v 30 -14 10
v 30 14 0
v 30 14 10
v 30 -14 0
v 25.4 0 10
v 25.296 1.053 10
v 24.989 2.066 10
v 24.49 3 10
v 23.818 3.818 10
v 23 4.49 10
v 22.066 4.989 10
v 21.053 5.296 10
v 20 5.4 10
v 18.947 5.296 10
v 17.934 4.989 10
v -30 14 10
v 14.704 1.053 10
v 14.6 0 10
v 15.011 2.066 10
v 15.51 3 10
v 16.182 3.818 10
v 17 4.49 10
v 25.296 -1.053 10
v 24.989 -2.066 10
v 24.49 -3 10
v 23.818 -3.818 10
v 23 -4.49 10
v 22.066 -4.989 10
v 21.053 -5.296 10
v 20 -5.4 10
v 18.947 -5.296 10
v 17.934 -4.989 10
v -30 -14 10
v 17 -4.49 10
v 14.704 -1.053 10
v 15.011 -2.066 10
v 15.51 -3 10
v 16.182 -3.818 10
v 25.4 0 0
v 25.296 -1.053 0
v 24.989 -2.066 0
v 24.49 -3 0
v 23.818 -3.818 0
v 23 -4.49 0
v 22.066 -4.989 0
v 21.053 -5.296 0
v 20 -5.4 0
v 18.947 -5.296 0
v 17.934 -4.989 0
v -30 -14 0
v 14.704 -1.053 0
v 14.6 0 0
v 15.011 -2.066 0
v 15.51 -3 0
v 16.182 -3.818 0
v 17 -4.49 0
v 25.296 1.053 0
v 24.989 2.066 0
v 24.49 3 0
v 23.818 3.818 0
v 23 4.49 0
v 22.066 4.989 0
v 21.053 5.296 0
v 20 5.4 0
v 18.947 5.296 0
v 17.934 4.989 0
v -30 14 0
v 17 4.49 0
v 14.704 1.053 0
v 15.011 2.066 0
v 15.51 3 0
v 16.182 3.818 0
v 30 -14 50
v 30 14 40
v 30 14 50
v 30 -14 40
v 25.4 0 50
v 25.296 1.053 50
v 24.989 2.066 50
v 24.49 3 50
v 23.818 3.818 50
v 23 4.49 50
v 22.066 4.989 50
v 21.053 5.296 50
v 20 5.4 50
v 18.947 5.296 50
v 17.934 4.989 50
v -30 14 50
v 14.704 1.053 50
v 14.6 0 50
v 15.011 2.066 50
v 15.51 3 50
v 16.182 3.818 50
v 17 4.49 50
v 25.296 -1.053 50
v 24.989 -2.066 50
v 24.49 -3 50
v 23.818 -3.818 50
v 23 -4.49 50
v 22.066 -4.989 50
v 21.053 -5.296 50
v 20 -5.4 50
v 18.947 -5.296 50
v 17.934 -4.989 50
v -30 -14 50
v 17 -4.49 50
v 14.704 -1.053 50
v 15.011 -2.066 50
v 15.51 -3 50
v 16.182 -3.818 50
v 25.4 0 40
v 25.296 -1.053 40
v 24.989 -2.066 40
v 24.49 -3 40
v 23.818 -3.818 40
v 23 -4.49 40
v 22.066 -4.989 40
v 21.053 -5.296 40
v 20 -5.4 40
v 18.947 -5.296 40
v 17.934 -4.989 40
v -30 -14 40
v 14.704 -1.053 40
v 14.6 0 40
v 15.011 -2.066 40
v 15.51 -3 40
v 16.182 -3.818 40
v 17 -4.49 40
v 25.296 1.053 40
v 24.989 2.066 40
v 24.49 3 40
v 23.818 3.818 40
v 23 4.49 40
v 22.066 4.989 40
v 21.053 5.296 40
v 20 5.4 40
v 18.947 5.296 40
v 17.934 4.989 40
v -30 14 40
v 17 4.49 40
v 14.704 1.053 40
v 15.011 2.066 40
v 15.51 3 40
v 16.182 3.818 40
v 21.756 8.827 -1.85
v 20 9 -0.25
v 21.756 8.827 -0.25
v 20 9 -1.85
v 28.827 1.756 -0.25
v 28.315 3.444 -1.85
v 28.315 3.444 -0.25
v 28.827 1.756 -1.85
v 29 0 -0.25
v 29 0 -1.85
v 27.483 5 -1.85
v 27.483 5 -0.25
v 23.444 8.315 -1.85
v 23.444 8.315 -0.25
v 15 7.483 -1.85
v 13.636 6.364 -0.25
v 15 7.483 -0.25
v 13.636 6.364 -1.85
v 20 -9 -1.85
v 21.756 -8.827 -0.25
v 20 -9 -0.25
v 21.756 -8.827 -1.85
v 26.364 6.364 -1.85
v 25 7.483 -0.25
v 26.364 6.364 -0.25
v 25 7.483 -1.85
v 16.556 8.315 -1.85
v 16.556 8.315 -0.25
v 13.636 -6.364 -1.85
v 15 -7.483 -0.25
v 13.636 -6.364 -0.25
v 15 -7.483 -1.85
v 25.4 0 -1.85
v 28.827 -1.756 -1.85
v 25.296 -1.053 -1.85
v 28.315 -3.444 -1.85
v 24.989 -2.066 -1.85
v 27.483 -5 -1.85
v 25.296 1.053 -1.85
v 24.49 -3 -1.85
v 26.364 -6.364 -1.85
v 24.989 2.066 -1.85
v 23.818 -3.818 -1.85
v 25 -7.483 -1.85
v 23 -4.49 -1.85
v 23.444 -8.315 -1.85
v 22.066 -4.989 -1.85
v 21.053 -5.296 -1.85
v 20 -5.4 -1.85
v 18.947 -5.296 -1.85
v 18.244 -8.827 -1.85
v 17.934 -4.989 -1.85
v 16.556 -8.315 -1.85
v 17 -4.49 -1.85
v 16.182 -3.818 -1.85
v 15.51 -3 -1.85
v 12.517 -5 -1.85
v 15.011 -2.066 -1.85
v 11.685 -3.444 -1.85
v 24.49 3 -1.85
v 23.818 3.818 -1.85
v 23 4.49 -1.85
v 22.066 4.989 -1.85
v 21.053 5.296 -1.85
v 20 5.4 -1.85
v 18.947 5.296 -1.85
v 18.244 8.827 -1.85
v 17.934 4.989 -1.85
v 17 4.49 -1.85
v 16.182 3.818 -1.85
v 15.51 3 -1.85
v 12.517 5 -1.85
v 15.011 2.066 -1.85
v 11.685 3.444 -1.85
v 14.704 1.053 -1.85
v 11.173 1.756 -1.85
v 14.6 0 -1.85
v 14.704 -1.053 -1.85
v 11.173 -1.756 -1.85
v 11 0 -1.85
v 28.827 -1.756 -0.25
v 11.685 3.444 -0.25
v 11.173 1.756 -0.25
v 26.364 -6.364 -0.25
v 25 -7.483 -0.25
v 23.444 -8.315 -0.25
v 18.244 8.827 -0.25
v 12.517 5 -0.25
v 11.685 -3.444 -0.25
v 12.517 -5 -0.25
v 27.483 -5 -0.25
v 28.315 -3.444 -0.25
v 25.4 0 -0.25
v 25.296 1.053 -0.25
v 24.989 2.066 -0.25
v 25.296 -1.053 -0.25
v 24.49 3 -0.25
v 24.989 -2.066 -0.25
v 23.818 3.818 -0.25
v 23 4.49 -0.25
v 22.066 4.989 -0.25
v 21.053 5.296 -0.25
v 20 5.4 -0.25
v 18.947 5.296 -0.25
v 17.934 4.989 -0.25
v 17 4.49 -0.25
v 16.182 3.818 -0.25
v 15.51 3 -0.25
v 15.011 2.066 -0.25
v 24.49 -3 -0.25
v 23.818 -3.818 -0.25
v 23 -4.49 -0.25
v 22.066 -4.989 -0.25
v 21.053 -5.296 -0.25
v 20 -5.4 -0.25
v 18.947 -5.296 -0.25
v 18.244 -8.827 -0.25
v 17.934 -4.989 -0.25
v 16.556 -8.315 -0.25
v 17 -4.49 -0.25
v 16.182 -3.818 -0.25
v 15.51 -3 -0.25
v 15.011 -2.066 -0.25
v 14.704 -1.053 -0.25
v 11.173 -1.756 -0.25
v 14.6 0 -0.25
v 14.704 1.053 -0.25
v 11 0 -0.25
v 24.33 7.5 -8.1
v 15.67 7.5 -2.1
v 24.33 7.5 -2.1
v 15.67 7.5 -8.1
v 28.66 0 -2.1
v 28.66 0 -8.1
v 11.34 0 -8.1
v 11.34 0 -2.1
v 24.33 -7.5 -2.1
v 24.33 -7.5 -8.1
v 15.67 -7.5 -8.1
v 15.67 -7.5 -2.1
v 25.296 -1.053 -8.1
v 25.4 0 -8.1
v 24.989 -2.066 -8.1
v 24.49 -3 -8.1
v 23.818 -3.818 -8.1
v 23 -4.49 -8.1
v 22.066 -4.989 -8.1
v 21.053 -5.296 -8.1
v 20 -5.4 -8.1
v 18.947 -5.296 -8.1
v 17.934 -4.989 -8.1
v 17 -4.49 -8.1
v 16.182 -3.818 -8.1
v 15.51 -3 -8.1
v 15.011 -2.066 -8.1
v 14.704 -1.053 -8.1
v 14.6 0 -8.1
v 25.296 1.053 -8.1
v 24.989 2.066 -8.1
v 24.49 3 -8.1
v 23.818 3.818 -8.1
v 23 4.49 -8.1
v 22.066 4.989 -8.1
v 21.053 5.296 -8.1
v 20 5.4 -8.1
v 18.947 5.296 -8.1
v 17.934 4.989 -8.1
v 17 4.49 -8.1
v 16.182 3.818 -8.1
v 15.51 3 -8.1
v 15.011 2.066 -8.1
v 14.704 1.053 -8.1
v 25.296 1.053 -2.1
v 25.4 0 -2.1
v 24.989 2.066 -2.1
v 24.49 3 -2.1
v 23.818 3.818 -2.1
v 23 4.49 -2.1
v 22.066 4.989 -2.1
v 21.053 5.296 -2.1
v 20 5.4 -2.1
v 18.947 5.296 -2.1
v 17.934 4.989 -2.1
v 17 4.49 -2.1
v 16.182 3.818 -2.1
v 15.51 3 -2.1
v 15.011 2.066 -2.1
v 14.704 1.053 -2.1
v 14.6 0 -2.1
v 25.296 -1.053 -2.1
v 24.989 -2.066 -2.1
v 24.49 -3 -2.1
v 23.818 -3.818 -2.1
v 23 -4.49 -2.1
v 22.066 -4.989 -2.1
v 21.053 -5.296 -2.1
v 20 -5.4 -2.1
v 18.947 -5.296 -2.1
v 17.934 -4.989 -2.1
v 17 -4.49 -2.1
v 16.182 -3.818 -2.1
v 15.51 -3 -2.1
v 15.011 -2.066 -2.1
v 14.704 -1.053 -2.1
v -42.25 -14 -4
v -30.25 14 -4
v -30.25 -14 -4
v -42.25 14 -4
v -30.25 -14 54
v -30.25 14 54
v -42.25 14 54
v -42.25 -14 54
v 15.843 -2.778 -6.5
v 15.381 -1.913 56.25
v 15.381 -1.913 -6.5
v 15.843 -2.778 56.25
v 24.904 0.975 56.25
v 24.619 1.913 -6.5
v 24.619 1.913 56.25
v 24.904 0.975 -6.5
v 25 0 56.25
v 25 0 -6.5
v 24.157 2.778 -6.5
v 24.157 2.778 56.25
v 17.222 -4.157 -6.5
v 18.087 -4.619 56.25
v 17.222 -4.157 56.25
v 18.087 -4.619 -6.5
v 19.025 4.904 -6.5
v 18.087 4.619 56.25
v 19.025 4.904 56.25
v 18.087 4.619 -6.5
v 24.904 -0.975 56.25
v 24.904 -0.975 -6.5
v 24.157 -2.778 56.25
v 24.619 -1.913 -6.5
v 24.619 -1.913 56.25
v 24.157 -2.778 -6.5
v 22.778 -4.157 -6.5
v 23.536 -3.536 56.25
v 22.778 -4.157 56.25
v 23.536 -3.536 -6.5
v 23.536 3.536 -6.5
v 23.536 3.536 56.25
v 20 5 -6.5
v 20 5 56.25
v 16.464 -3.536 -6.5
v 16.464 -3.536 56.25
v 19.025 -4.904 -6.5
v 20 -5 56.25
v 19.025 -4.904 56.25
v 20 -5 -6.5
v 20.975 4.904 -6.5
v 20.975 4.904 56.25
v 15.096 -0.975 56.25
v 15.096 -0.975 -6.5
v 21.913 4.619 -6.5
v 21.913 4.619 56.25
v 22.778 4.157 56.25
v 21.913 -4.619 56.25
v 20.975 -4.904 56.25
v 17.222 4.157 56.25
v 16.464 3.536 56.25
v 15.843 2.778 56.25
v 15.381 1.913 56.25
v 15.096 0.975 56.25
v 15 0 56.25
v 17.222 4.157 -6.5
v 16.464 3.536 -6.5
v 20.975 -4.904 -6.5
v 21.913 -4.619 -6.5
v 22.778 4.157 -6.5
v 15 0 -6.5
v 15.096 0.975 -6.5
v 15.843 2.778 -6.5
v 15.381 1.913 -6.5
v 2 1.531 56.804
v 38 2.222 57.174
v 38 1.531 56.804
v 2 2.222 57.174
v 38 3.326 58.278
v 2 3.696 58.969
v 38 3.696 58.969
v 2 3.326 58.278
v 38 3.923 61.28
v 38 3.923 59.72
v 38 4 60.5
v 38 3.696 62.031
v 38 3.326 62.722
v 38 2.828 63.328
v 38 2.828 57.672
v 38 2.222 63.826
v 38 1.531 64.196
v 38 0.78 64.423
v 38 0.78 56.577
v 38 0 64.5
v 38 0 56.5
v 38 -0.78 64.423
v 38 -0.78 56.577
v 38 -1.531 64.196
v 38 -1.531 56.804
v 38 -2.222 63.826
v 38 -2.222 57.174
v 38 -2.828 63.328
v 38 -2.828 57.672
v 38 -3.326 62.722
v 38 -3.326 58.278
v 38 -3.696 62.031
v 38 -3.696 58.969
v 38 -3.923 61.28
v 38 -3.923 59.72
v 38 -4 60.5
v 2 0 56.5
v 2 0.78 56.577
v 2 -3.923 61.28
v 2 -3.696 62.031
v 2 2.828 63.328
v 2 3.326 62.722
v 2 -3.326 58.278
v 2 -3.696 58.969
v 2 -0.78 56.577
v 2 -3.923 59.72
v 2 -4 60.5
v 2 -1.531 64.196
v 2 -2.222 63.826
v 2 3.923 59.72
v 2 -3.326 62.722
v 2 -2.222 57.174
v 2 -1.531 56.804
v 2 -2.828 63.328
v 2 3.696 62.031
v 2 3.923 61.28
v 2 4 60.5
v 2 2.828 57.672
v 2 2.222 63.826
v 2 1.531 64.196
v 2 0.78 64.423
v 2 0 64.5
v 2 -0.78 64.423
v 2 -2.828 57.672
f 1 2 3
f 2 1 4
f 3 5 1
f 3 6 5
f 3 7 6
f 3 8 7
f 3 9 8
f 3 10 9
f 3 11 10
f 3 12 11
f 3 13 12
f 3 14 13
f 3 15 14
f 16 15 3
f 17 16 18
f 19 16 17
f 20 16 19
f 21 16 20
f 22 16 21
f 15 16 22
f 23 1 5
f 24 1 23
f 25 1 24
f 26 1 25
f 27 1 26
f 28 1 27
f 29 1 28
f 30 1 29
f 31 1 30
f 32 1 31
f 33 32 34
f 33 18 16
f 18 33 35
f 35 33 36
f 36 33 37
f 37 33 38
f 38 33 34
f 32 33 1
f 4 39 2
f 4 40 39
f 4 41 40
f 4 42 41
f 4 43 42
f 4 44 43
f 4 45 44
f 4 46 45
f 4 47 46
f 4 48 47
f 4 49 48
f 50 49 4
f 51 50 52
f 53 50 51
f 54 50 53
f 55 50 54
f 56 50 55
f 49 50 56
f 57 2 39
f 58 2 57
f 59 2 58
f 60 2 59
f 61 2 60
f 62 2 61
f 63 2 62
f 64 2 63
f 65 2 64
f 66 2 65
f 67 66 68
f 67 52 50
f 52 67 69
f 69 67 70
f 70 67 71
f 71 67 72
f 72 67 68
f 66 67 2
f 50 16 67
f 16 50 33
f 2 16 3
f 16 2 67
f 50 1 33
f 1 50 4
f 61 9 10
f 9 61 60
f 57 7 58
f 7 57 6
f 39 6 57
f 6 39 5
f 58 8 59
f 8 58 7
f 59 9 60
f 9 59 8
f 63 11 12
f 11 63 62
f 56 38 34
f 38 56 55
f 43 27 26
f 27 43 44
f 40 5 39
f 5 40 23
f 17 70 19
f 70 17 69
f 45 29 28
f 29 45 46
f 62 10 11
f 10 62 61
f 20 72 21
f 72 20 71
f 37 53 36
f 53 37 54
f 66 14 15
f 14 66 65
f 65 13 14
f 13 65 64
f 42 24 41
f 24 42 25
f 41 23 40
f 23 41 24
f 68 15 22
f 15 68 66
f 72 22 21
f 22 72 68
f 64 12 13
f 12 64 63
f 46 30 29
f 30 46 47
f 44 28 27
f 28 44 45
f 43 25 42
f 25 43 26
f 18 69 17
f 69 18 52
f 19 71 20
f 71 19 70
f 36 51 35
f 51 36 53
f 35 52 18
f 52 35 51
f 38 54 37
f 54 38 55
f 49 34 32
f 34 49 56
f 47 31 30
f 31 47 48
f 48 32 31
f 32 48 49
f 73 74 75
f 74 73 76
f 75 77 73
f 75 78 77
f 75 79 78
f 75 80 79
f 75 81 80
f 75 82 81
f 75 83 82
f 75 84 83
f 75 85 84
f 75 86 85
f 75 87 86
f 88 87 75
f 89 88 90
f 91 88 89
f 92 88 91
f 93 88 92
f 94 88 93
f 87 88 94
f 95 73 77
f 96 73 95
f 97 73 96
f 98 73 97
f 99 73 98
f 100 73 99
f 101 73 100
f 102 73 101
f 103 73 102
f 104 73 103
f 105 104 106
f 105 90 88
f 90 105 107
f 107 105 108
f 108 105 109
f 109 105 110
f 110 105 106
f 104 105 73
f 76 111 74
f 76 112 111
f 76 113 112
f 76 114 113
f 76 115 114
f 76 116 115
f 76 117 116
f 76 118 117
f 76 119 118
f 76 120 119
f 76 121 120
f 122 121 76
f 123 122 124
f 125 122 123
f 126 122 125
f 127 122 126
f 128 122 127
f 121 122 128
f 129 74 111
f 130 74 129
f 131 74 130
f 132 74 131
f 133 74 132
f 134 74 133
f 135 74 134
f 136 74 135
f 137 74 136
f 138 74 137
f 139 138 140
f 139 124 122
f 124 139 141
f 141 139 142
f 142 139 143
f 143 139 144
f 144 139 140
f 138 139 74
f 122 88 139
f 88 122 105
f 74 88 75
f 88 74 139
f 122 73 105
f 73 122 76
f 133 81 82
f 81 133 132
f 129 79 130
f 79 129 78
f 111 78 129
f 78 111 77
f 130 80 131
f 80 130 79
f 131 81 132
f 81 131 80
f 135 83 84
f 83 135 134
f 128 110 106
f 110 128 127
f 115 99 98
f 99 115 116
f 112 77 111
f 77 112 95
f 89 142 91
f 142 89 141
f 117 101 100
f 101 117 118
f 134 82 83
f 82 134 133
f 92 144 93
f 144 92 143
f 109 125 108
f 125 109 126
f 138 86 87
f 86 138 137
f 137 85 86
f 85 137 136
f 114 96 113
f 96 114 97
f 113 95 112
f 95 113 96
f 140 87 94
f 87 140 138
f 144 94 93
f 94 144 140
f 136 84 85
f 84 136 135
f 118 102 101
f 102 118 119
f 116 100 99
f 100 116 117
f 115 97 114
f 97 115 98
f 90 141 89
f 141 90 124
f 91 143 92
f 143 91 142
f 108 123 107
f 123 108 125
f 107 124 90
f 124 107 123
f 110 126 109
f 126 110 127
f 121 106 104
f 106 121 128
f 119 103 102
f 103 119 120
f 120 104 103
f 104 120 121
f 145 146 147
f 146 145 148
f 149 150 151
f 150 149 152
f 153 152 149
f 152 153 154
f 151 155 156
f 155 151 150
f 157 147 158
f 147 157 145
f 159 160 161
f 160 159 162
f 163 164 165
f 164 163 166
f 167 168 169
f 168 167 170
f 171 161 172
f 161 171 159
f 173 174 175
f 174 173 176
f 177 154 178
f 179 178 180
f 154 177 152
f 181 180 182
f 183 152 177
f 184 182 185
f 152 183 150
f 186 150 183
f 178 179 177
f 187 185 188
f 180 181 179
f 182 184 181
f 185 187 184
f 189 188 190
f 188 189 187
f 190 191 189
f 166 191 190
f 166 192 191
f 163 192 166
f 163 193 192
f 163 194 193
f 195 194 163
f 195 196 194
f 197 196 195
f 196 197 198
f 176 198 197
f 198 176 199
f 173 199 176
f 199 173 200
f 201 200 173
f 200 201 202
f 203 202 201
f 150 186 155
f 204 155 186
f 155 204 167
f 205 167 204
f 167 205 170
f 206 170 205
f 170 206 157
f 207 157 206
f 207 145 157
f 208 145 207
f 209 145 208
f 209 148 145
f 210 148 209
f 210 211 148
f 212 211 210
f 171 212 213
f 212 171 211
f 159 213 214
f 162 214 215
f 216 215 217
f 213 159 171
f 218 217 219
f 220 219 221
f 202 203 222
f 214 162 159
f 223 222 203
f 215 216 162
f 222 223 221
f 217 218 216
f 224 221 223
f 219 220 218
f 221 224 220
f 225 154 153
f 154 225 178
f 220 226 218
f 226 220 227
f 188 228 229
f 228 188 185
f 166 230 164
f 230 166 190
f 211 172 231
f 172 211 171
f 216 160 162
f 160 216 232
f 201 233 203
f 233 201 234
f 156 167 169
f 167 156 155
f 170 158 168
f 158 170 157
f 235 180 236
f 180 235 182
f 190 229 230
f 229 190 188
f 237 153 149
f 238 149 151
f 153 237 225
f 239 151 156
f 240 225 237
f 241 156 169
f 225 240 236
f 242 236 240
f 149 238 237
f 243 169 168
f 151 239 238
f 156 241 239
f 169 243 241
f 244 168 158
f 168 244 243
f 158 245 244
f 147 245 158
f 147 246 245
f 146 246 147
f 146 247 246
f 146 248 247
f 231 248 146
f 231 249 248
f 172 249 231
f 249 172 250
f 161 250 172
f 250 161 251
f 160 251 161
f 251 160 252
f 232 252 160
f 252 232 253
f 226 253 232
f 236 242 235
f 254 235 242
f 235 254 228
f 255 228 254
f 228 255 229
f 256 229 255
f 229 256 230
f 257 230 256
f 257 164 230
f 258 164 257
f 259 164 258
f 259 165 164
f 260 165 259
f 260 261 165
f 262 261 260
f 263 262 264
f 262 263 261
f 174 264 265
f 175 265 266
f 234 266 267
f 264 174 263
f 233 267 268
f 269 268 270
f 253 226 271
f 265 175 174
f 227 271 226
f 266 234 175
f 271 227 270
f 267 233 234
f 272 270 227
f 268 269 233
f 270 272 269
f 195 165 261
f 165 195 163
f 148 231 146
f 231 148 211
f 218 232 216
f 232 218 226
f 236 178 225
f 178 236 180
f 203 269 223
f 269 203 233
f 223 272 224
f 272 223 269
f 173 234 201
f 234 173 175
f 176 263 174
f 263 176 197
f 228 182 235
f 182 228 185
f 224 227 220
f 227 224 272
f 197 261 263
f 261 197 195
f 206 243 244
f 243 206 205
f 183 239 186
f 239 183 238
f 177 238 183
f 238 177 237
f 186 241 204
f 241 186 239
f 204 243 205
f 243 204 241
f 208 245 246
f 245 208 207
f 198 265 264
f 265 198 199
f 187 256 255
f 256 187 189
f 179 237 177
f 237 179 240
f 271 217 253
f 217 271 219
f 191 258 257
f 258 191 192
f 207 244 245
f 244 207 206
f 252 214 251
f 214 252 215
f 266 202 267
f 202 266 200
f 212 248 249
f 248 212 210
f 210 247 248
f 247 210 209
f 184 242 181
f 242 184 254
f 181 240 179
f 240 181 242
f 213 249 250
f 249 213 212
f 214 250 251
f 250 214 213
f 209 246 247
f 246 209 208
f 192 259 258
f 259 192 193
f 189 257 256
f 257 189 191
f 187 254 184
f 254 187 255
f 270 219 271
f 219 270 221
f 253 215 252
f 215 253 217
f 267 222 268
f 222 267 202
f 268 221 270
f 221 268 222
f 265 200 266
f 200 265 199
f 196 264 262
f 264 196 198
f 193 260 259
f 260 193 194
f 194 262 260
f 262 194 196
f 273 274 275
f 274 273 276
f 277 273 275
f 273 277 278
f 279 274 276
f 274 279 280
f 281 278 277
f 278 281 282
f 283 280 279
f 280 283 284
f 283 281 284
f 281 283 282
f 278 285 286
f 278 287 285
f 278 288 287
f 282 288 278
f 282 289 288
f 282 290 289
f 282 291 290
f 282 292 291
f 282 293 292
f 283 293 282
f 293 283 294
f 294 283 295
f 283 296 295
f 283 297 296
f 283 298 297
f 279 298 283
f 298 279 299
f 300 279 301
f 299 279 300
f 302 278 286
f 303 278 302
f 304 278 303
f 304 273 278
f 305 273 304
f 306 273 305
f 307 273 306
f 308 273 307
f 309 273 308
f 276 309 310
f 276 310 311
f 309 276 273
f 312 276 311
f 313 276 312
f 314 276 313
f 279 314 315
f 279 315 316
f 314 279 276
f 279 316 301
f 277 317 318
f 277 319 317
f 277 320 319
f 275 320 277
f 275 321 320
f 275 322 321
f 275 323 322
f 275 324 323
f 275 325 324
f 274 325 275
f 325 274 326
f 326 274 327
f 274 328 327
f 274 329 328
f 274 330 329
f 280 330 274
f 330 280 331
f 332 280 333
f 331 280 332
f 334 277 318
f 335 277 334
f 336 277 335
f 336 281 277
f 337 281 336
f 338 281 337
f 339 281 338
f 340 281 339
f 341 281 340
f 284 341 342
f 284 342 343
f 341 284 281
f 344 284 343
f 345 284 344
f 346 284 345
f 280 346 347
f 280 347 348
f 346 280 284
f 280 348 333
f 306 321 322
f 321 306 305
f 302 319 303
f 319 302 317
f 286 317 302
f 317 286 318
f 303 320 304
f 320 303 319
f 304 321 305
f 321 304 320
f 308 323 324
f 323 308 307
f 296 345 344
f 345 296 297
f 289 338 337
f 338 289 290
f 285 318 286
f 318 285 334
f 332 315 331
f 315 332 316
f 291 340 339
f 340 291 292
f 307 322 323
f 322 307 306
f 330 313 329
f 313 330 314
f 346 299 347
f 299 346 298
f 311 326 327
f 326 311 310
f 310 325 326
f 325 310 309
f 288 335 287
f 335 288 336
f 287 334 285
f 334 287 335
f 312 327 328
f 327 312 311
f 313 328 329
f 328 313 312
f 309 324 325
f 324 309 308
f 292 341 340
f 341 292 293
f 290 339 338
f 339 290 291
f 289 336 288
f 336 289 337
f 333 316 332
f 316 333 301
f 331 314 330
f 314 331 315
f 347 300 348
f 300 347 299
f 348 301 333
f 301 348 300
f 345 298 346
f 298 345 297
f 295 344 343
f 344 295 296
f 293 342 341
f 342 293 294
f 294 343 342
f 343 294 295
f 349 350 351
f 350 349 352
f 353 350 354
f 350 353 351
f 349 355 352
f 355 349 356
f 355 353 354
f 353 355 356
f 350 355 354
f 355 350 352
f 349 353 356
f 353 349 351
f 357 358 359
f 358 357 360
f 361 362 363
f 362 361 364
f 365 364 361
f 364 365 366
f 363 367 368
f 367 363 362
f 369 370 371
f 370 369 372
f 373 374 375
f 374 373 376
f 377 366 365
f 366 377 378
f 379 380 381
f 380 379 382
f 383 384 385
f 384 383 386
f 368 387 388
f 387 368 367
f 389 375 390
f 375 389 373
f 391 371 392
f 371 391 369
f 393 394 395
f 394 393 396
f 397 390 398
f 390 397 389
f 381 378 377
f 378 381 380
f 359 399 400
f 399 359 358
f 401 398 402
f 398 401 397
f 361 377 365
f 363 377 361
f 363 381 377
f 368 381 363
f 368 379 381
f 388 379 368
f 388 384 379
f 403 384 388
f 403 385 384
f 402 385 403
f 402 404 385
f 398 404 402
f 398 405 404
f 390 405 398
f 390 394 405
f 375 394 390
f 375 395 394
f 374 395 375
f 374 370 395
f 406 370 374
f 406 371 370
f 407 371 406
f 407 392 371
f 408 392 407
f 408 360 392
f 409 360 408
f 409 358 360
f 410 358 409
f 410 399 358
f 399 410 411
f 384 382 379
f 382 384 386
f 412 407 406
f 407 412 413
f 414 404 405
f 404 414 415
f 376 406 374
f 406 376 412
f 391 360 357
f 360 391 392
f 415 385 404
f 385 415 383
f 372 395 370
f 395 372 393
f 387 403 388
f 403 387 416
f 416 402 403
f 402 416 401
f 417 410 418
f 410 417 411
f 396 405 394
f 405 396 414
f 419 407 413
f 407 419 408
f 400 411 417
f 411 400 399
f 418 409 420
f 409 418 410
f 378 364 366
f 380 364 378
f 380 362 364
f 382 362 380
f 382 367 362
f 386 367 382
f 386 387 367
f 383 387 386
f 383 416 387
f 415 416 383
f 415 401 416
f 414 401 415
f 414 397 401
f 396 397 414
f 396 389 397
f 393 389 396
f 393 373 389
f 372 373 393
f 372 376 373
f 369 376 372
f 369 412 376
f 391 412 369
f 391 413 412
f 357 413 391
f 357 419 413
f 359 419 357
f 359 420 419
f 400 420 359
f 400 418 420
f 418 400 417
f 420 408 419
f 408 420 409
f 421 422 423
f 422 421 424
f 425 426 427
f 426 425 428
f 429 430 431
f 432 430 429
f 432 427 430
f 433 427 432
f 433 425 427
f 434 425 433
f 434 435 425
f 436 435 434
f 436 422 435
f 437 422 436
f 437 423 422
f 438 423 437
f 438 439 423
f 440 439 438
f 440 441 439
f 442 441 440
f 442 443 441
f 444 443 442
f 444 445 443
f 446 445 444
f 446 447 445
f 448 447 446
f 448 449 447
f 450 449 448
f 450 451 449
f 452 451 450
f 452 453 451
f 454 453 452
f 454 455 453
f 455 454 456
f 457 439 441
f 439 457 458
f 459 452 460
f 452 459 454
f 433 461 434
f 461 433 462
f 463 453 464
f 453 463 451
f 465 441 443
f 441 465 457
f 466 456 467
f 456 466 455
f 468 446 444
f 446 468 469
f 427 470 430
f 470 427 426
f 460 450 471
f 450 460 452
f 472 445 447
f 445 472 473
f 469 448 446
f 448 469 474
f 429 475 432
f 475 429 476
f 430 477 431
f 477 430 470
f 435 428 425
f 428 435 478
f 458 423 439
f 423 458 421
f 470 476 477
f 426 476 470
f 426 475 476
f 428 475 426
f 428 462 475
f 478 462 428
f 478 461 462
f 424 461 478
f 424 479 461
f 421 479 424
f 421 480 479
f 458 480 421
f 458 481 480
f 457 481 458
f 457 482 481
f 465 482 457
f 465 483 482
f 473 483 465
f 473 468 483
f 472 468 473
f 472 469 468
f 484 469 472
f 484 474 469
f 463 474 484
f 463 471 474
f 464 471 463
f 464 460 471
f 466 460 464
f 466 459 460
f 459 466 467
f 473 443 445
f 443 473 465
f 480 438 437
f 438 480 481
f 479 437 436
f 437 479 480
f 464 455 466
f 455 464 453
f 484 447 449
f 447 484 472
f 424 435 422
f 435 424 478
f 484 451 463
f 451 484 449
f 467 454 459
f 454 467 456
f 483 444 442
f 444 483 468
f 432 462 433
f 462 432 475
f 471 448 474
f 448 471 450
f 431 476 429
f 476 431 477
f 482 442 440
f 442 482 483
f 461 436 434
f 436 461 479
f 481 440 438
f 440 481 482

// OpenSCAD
$fn = 32;

// ------------------------------------------------------------------------
// C clamp: throat 40 mm, screw d10
// Every part is its own module, assembly() places every instance.
// ------------------------------------------------------------------------

// --- part 1 ---
module clamp_arm() {
  difference() {
    translate([-30, -14, 0]) cube([60, 28, 10]);
    translate([20, 0, -1]) cylinder(h = 12, d = 10.8);
  }
}

// --- part 2 ---
module clamp_spine() {
  difference() {
    translate([-29, -14, 0]) cube([58, 28, 12]);
  }
}

// --- part 3 ---
module clamp_screw() {
  translate([0, 0, -31.375]) cylinder(h = 62.75, d = 10);
}

// --- part 4 ---
module clamp_washer() {
  difference() {
      translate([0, 0, 0]) cylinder(h = 1.6, d = 18);
      translate([0, 0, -1]) cylinder(h = 3.6, d = 10.8);
    }
}

// --- part 5 ---
module clamp_nut() {
  difference() {
    linear_extrude(height = 6) polygon(points = [[8.66, 0], [4.33, 7.5], [-4.33, 7.5], [-8.66, 0], [-4.33, -7.5], [4.33, -7.5]]);
    translate([0, 0, -1]) cylinder(h = 8, d = 10.8);
  }
}

// --- part 6 ---
module tommy_bar() {
  translate([0, 0, -18]) cylinder(h = 36, d = 8);
}

// --- assembly ---
module assembly() {
  color([0.80, 0.24, 0.20]) translate([0, 0, 0]) rotate([0, 0, 0]) clamp_arm();
  color([0.20, 0.45, 0.75]) translate([0, 0, 40]) rotate([0, 0, 0]) clamp_arm();
  color([0.25, 0.62, 0.32]) translate([-42.25, 0, 25]) rotate([0, 90, 0]) clamp_spine();
  color([0.92, 0.70, 0.18]) translate([20, 0, 24.875]) rotate([0, 0, 0]) clamp_screw();
  color([0.58, 0.35, 0.70]) translate([20, 0, -1.85]) rotate([0, 0, 0]) clamp_washer();
  color([0.16, 0.66, 0.66]) translate([20, 0, -8.1]) rotate([0, 0, 0]) clamp_nut();
  color([0.85, 0.48, 0.18]) translate([20, 0, 60.5]) rotate([0, 90, 0]) tommy_bar();
}

assembly();
